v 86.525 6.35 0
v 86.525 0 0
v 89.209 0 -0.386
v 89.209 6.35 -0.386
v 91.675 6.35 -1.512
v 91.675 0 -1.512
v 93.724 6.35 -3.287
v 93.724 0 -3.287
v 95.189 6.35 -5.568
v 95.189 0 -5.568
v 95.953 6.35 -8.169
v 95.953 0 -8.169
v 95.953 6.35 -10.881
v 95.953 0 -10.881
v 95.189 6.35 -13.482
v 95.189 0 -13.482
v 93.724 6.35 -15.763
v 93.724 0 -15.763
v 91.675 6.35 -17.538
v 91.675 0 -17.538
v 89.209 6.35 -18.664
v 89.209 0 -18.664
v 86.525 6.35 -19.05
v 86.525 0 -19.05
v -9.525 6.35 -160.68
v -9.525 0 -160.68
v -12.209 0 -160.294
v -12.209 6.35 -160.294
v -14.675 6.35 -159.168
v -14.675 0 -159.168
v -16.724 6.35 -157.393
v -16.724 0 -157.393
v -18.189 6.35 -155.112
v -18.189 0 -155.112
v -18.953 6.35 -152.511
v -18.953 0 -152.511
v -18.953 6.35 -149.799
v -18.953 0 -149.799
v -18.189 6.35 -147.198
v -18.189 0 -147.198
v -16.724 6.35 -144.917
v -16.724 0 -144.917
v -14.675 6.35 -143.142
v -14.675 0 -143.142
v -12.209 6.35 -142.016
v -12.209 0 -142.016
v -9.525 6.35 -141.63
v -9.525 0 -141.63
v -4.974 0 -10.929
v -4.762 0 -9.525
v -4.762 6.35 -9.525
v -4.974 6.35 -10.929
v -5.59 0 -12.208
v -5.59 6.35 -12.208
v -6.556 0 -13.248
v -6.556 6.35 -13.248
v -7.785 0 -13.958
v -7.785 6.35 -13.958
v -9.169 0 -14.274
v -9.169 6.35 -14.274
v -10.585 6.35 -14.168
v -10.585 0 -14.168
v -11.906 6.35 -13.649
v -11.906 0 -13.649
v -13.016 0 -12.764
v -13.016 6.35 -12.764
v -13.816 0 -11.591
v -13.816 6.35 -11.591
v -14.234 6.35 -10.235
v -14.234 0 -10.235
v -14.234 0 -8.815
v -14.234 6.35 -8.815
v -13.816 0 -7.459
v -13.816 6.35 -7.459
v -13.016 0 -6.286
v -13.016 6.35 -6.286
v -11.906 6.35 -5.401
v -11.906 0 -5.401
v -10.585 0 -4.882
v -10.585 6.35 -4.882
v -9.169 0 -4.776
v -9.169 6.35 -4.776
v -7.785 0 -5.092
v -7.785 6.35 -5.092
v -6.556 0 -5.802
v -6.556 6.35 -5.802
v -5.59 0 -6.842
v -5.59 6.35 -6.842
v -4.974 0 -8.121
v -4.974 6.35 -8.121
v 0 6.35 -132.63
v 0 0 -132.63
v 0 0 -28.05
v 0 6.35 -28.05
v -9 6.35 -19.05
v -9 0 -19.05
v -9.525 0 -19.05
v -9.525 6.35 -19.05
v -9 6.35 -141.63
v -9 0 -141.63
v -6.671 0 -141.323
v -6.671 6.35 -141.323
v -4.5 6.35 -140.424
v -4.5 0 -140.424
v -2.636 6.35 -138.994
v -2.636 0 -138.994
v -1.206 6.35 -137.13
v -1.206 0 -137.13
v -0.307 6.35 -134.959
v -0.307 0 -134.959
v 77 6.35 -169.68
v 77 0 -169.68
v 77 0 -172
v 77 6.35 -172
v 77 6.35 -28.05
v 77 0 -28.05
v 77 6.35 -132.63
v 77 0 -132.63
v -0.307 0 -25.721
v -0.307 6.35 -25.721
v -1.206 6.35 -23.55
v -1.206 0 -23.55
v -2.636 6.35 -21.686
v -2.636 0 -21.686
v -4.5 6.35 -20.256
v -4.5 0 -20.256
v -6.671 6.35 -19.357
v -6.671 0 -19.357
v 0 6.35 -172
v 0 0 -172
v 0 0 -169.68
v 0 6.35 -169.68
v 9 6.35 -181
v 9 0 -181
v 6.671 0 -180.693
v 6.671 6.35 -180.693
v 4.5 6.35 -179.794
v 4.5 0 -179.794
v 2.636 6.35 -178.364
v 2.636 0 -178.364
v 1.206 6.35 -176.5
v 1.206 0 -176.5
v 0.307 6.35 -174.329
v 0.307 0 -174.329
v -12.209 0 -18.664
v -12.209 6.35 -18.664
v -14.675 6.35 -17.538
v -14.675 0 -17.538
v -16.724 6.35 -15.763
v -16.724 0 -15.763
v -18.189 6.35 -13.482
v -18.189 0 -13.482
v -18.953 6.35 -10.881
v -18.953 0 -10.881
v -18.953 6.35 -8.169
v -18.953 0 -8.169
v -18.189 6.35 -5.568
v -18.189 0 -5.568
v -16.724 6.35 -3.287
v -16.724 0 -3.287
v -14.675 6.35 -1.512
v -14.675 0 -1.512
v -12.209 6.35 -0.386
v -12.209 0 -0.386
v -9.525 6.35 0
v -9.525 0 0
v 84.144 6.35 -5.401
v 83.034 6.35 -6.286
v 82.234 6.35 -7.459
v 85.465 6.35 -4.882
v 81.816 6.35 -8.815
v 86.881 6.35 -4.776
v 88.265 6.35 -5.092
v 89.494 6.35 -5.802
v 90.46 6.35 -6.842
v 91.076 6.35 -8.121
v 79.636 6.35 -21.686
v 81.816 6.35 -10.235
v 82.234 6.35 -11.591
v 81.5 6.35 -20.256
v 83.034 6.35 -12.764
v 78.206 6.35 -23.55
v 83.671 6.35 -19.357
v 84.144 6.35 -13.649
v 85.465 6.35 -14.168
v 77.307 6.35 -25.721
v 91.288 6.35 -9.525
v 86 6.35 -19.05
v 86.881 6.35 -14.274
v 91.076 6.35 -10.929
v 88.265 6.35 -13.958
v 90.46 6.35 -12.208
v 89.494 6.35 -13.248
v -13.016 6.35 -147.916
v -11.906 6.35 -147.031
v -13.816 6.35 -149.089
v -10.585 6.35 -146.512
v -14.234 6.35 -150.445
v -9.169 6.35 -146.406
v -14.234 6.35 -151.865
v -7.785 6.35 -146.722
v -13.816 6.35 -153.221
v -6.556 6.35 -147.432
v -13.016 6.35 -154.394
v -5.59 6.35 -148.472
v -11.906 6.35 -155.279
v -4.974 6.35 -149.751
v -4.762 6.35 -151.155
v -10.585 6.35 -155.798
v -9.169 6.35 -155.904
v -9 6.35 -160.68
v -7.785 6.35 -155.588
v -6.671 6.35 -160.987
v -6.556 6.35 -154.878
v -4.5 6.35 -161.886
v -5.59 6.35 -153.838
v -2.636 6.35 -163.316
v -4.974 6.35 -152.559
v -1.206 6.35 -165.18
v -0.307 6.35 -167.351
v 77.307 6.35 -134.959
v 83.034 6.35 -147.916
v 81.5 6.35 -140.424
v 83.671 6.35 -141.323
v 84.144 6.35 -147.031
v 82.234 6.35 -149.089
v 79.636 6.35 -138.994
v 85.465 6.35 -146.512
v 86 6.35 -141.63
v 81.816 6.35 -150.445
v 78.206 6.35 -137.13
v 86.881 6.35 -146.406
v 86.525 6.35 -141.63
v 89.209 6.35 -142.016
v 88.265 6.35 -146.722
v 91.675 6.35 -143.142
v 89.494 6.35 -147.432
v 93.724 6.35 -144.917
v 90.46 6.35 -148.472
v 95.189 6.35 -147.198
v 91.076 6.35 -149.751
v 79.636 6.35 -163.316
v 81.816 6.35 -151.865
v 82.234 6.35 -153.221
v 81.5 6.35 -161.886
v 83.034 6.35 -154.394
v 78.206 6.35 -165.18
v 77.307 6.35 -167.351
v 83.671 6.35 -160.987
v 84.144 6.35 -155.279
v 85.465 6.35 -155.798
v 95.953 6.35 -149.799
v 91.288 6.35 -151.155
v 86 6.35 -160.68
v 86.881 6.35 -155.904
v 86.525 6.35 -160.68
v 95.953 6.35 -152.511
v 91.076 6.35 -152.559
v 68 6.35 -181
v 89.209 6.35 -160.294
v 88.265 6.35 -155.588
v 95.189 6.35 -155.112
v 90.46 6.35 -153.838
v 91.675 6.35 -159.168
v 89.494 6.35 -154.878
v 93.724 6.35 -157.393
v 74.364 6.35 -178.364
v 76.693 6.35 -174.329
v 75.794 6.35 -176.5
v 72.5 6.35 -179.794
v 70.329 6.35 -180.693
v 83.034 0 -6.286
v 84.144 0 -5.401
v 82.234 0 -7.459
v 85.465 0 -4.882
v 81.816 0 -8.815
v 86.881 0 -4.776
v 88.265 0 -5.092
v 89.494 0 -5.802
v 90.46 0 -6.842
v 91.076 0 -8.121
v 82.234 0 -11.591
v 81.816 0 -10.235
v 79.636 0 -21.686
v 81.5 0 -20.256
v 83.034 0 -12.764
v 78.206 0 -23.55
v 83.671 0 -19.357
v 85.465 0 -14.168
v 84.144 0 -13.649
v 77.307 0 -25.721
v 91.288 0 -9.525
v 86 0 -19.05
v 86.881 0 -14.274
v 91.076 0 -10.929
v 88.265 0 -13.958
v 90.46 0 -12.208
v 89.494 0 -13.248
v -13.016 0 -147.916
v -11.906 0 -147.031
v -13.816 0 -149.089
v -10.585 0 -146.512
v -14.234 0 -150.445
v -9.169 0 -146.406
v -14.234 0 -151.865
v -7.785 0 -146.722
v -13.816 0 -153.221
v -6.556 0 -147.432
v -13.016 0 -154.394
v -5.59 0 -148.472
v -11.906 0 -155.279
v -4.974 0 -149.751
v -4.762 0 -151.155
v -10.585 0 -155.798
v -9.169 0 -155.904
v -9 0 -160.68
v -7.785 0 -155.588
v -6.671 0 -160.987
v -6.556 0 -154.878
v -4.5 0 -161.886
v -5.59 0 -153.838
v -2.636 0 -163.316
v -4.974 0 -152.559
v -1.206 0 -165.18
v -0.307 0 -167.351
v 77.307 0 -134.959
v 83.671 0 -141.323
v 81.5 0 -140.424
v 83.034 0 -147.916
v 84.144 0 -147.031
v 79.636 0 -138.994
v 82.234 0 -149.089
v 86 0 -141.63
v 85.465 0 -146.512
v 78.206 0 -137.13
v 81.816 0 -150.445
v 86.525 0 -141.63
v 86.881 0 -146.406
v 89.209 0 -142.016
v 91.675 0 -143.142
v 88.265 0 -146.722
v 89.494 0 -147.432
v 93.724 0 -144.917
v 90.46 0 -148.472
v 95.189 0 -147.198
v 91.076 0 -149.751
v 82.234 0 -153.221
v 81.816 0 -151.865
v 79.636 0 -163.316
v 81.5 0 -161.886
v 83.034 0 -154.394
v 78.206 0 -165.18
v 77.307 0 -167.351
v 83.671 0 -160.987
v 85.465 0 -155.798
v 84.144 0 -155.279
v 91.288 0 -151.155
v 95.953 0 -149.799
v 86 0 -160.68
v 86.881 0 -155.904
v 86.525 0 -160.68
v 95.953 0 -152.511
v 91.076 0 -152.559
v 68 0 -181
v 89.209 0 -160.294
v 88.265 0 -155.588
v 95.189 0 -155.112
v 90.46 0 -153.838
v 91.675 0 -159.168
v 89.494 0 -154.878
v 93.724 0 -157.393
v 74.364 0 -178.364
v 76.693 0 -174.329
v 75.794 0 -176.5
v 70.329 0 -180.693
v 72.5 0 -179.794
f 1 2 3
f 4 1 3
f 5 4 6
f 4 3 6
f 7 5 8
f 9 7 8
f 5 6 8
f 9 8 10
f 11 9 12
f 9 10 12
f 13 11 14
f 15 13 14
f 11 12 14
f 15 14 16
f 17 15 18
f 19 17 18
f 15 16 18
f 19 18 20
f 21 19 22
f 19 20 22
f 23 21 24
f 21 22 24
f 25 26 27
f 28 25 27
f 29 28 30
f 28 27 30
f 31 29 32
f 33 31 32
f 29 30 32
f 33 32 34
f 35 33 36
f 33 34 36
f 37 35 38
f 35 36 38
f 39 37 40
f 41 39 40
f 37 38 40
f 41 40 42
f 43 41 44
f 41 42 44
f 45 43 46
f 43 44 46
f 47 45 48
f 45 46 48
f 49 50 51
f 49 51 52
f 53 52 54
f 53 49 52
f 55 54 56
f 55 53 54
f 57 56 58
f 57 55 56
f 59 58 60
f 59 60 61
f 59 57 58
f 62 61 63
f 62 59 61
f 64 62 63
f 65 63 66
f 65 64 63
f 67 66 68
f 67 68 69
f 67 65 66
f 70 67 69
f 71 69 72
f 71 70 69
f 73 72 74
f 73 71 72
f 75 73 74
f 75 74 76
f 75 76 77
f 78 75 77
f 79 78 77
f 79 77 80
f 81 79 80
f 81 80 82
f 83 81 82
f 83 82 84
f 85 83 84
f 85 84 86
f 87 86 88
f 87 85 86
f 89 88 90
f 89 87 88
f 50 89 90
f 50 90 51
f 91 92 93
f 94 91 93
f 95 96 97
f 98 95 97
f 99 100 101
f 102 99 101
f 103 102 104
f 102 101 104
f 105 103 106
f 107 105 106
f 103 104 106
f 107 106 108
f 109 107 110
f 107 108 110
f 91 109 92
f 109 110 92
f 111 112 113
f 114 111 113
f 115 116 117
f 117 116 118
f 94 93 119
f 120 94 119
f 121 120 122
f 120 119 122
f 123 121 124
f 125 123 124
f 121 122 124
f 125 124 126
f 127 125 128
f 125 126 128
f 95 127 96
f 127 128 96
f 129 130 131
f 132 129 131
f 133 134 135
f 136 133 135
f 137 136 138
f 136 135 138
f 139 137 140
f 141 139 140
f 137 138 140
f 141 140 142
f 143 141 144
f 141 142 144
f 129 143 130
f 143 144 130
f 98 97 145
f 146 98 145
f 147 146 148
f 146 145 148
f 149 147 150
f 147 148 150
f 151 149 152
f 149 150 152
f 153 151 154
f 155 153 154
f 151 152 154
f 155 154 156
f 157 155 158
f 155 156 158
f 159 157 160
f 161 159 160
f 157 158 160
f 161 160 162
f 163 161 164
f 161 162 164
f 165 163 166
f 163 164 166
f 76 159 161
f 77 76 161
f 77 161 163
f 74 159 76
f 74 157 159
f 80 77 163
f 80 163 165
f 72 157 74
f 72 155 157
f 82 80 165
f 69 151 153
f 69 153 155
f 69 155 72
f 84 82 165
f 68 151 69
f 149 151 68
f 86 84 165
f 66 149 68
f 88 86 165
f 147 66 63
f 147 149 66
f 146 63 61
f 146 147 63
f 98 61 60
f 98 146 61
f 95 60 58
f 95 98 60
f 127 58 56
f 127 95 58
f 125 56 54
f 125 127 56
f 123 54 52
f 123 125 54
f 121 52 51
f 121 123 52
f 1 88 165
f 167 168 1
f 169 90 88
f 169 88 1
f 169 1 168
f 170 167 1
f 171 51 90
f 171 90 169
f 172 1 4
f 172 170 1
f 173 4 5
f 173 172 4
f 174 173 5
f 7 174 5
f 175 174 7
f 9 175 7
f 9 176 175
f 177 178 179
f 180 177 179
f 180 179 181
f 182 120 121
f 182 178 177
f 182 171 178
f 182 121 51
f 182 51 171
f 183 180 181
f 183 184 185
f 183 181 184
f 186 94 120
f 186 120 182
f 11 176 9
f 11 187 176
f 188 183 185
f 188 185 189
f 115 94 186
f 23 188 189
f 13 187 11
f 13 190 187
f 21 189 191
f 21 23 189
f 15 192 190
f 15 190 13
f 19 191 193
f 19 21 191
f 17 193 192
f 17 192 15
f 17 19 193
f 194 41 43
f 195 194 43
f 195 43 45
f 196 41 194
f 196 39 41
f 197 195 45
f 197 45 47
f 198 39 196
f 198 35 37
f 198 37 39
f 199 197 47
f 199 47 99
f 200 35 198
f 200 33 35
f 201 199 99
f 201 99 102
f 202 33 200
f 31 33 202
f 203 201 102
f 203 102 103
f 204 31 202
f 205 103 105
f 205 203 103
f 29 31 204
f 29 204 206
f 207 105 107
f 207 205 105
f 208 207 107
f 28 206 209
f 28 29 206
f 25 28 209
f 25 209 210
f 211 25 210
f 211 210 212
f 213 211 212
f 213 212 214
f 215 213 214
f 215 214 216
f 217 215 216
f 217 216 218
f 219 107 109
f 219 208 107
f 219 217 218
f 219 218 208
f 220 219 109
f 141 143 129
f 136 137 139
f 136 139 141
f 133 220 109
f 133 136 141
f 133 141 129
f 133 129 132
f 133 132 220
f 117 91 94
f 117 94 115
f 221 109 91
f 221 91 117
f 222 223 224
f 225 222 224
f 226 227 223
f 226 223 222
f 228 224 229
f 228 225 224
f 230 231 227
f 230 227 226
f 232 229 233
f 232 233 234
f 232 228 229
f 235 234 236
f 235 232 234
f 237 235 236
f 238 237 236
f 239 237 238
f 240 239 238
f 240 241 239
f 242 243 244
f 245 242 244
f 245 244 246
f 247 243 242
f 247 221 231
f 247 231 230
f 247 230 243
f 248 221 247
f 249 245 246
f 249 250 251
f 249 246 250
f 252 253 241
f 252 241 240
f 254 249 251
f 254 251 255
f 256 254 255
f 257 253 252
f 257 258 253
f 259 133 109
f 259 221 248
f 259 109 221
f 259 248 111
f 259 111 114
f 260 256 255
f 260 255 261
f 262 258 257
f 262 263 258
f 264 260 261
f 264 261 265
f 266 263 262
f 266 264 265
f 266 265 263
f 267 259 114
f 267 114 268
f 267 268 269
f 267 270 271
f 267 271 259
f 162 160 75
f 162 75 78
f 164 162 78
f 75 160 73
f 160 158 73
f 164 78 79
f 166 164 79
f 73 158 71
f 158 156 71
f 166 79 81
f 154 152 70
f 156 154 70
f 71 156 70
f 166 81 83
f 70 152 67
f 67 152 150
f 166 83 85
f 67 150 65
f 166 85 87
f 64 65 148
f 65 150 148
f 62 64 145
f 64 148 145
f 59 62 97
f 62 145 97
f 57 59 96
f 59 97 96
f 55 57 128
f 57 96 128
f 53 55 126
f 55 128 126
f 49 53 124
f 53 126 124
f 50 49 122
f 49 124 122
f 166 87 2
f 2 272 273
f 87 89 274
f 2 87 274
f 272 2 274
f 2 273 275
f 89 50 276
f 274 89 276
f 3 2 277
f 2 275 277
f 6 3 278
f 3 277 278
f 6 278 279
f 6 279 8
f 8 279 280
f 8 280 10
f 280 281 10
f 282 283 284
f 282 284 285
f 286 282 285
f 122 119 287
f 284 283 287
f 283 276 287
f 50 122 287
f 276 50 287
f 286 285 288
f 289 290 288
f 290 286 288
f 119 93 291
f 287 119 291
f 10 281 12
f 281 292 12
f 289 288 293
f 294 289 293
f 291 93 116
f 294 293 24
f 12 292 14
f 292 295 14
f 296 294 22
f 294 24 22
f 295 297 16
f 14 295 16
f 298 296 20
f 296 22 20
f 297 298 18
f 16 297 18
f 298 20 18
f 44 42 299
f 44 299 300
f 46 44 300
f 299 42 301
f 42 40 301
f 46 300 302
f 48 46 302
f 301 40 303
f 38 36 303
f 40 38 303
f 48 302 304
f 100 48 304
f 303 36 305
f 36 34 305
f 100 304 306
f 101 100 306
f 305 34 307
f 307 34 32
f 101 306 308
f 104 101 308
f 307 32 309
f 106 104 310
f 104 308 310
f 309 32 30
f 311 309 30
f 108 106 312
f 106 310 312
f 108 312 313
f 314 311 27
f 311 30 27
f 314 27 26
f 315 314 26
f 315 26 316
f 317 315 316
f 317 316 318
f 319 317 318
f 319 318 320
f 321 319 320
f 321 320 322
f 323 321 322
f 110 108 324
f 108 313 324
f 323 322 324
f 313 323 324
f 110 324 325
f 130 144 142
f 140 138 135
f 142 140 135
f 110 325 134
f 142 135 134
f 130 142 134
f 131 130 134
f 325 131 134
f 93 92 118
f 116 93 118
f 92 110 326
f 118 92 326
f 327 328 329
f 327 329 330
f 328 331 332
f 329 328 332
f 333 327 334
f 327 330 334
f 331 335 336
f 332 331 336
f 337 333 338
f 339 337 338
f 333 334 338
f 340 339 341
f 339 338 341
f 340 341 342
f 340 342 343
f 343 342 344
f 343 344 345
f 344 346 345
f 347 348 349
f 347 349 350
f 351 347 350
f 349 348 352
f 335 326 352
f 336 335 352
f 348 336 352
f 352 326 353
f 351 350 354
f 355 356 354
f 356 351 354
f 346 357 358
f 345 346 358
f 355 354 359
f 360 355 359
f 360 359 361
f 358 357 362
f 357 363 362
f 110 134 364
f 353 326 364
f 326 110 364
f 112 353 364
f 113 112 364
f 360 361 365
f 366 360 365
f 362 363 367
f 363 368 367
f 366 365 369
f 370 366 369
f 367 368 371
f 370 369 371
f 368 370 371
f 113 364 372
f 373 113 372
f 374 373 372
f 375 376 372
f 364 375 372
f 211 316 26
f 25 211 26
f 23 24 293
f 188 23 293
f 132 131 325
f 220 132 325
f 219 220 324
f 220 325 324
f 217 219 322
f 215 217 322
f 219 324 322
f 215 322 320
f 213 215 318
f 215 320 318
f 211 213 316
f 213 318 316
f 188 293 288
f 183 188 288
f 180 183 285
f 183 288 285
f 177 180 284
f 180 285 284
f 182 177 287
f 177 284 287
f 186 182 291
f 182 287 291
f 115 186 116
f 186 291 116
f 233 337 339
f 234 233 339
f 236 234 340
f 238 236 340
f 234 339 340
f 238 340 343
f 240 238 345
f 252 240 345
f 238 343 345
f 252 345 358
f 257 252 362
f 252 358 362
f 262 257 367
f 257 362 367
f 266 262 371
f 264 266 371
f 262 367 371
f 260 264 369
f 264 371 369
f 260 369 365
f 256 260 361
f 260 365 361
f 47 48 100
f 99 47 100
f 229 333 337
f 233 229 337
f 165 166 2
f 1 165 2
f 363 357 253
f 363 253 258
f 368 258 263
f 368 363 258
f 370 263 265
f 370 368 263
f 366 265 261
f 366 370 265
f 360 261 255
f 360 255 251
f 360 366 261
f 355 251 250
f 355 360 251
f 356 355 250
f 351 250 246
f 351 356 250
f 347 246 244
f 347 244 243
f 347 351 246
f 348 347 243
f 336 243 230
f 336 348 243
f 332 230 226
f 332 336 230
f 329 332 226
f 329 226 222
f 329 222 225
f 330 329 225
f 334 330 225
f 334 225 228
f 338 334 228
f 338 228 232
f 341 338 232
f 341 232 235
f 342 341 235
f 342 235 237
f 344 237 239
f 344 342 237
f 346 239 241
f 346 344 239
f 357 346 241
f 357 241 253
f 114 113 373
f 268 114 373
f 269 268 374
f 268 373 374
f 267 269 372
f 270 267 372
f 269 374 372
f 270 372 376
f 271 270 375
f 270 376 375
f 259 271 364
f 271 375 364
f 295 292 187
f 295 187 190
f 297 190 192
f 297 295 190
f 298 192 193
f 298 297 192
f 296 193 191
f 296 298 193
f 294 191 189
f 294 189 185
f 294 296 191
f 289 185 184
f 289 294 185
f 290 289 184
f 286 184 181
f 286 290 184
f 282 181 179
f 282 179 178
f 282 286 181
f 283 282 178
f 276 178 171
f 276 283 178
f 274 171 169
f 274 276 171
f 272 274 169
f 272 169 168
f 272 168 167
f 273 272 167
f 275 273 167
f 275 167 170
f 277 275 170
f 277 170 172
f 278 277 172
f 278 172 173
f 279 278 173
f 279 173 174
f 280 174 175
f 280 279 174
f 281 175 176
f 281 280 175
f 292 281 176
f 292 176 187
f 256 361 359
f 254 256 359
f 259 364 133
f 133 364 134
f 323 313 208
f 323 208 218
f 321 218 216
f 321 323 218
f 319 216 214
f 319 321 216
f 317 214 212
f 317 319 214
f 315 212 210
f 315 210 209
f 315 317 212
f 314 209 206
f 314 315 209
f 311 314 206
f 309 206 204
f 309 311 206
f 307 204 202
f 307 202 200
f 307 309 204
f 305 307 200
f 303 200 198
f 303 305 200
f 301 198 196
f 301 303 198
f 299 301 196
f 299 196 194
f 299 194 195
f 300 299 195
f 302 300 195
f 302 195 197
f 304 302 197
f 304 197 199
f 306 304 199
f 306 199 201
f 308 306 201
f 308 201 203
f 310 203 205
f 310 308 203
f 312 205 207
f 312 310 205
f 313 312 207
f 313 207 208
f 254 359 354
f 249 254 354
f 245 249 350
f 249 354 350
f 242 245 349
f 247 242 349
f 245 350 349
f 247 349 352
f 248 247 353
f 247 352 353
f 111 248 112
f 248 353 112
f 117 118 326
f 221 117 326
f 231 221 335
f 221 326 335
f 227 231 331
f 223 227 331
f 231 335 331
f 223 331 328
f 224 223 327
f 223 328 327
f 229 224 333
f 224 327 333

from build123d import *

# Parameters (mm, degrees)
SKETCH1_R           = 4.7625
BOSS_EXTRUDE1_DEPTH = 6.35


with BuildPart() as part:
    # Sketch1 → Boss-Extrude1 (new body)
    with BuildSketch(Plane(origin=(0, 0, 0), x_dir=(1, 0, 0), z_dir=(0, 1, 0))):
        with BuildLine():
            Line((0, 132.63), (0, 28.05))
            ThreePointArc((0, 28.05), (-2.636038969, 21.686038969), (-9, 19.05))
            Line((-9, 19.05), (-9.525, 19.05))
            ThreePointArc((-9.525, 19.05), (-19.05, 9.525), (-9.525, 0))
            Line((-9.525, 0), (0, 0))
            Line((0, 0), (77, 0))
            Line((77, 0), (86.525, 0))
            ThreePointArc((86.525, 0), (96.05, 9.525), (86.525, 19.05))
            Line((86.525, 19.05), (86, 19.05))
            ThreePointArc((86, 19.05), (79.636038969, 21.686038969), (77, 28.05))
            Line((77, 28.05), (77, 132.63))
            ThreePointArc((77, 132.63), (79.636038969, 138.993961031), (86, 141.63))
            Line((86, 141.63), (86.525, 141.63))
            ThreePointArc((86.525, 141.63), (96.05, 151.155), (86.525, 160.68))
            Line((86.525, 160.68), (86, 160.68))
            ThreePointArc((86, 160.68), (79.636038969, 163.316038969), (77, 169.68))
            Line((77, 169.68), (77, 172))
            ThreePointArc((77, 172), (74.363961031, 178.363961031), (68, 181))
            Line((68, 181), (9, 181))
            ThreePointArc((9, 181), (2.636038969, 178.363961031), (0, 172))
            Line((0, 172), (0, 169.68))
            ThreePointArc((0, 169.68), (-2.636038969, 163.316038969), (-9, 160.68))
            Line((-9, 160.68), (-9.525, 160.68))
            ThreePointArc((-9.525, 160.68), (-19.05, 151.155), (-9.525, 141.63))
            Line((-9.525, 141.63), (-9, 141.63))
            ThreePointArc((-9, 141.63), (-2.636038969, 138.993961031), (0, 132.63))
        make_face()
        with Locations((86.525, 151.155)):
            Circle(SKETCH1_R, mode=Mode.SUBTRACT)
        with Locations((-9.525, 151.155)):
            Circle(SKETCH1_R, mode=Mode.SUBTRACT)
        with Locations((-9.525, 9.525)):
            Circle(SKETCH1_R, mode=Mode.SUBTRACT)
        with Locations((86.525, 9.525)):
            Circle(SKETCH1_R, mode=Mode.SUBTRACT)
    extrude(amount=BOSS_EXTRUDE1_DEPTH)


solid = part.part
